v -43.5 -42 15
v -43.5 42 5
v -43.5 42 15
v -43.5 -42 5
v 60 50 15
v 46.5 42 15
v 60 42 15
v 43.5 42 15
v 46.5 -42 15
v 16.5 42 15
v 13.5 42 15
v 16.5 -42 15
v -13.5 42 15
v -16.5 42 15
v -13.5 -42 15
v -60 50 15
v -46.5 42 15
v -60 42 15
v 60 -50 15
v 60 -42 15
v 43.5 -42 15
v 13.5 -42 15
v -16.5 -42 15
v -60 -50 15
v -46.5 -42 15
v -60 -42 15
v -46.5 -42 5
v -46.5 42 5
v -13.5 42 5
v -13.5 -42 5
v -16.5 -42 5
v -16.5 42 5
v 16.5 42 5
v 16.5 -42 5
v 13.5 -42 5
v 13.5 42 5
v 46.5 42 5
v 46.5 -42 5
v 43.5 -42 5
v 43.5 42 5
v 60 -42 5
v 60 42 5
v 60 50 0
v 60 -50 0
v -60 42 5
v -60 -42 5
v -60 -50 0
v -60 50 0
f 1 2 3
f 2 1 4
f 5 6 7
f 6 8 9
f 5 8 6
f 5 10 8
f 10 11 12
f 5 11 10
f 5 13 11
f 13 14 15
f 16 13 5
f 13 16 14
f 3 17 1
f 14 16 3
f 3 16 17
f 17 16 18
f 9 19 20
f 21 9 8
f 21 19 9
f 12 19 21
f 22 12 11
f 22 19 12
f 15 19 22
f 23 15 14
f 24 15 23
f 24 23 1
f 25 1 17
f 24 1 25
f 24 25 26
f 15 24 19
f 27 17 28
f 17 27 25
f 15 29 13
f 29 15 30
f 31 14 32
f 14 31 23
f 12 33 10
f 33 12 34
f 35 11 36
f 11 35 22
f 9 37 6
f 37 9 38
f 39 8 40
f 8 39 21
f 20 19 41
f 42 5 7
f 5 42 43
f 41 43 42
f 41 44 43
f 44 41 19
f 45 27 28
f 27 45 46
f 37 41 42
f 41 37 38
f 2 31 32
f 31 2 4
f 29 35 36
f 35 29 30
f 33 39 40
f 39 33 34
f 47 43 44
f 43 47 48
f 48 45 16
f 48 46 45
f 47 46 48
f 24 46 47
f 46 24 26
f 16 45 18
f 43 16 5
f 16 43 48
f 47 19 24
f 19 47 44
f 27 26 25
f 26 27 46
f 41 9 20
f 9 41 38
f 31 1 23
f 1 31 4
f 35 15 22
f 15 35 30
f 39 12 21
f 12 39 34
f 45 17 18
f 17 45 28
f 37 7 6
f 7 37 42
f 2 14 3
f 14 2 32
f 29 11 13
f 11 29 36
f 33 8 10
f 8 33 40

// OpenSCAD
$fn = 32;

// ----------------------------------------------------------------------
// Rib frame 120 x 100 x 15
// 4 ribs at 30 mm pitch
// ----------------------------------------------------------------------

// --- parameters (mm) ---
frame = [120, 100, 5];  // base plate size (x, y, z)
rail_w = 8;             // side rail width
ribs = 4;               // number of ribs
rib_t = 3;              // rib thickness
rib_h = 10;             // rib height above the base plate
pitch = 30;             // pitch between rib centres

// --- derived feature positions (mm) ---
span = (ribs - 1) * pitch;          // = 90   distance between the outer ribs
origin_x = -span / 2;               // = -45   X of the first rib
rib_len = frame[1] - 2 * rail_w + 2;  // = 86   rib length, 1 mm into each rail
feature_centers = [
  [origin_x + 0 * pitch, 0],
  [origin_x + 1 * pitch, 0],
  [origin_x + 2 * pitch, 0],
  [origin_x + 3 * pitch, 0]
];   // rib centre line, drives the rib loop

// base plate, two side rails, then the ribs read straight off feature_centers
union() {
  translate([-frame[0] / 2, -frame[1] / 2, 0]) cube(frame);
  translate([-frame[0] / 2, -frame[1] / 2, 0]) cube([frame[0], rail_w, frame[2] + rib_h]);
  translate([-frame[0] / 2, frame[1] / 2 - rail_w, 0]) cube([frame[0], rail_w, frame[2] + rib_h]);
  for (centre = feature_centers)
    translate([centre[0] - rib_t / 2, centre[1] - rib_len / 2, frame[2] - 1])
      cube([rib_t, rib_len, rib_h + 1]);
}
